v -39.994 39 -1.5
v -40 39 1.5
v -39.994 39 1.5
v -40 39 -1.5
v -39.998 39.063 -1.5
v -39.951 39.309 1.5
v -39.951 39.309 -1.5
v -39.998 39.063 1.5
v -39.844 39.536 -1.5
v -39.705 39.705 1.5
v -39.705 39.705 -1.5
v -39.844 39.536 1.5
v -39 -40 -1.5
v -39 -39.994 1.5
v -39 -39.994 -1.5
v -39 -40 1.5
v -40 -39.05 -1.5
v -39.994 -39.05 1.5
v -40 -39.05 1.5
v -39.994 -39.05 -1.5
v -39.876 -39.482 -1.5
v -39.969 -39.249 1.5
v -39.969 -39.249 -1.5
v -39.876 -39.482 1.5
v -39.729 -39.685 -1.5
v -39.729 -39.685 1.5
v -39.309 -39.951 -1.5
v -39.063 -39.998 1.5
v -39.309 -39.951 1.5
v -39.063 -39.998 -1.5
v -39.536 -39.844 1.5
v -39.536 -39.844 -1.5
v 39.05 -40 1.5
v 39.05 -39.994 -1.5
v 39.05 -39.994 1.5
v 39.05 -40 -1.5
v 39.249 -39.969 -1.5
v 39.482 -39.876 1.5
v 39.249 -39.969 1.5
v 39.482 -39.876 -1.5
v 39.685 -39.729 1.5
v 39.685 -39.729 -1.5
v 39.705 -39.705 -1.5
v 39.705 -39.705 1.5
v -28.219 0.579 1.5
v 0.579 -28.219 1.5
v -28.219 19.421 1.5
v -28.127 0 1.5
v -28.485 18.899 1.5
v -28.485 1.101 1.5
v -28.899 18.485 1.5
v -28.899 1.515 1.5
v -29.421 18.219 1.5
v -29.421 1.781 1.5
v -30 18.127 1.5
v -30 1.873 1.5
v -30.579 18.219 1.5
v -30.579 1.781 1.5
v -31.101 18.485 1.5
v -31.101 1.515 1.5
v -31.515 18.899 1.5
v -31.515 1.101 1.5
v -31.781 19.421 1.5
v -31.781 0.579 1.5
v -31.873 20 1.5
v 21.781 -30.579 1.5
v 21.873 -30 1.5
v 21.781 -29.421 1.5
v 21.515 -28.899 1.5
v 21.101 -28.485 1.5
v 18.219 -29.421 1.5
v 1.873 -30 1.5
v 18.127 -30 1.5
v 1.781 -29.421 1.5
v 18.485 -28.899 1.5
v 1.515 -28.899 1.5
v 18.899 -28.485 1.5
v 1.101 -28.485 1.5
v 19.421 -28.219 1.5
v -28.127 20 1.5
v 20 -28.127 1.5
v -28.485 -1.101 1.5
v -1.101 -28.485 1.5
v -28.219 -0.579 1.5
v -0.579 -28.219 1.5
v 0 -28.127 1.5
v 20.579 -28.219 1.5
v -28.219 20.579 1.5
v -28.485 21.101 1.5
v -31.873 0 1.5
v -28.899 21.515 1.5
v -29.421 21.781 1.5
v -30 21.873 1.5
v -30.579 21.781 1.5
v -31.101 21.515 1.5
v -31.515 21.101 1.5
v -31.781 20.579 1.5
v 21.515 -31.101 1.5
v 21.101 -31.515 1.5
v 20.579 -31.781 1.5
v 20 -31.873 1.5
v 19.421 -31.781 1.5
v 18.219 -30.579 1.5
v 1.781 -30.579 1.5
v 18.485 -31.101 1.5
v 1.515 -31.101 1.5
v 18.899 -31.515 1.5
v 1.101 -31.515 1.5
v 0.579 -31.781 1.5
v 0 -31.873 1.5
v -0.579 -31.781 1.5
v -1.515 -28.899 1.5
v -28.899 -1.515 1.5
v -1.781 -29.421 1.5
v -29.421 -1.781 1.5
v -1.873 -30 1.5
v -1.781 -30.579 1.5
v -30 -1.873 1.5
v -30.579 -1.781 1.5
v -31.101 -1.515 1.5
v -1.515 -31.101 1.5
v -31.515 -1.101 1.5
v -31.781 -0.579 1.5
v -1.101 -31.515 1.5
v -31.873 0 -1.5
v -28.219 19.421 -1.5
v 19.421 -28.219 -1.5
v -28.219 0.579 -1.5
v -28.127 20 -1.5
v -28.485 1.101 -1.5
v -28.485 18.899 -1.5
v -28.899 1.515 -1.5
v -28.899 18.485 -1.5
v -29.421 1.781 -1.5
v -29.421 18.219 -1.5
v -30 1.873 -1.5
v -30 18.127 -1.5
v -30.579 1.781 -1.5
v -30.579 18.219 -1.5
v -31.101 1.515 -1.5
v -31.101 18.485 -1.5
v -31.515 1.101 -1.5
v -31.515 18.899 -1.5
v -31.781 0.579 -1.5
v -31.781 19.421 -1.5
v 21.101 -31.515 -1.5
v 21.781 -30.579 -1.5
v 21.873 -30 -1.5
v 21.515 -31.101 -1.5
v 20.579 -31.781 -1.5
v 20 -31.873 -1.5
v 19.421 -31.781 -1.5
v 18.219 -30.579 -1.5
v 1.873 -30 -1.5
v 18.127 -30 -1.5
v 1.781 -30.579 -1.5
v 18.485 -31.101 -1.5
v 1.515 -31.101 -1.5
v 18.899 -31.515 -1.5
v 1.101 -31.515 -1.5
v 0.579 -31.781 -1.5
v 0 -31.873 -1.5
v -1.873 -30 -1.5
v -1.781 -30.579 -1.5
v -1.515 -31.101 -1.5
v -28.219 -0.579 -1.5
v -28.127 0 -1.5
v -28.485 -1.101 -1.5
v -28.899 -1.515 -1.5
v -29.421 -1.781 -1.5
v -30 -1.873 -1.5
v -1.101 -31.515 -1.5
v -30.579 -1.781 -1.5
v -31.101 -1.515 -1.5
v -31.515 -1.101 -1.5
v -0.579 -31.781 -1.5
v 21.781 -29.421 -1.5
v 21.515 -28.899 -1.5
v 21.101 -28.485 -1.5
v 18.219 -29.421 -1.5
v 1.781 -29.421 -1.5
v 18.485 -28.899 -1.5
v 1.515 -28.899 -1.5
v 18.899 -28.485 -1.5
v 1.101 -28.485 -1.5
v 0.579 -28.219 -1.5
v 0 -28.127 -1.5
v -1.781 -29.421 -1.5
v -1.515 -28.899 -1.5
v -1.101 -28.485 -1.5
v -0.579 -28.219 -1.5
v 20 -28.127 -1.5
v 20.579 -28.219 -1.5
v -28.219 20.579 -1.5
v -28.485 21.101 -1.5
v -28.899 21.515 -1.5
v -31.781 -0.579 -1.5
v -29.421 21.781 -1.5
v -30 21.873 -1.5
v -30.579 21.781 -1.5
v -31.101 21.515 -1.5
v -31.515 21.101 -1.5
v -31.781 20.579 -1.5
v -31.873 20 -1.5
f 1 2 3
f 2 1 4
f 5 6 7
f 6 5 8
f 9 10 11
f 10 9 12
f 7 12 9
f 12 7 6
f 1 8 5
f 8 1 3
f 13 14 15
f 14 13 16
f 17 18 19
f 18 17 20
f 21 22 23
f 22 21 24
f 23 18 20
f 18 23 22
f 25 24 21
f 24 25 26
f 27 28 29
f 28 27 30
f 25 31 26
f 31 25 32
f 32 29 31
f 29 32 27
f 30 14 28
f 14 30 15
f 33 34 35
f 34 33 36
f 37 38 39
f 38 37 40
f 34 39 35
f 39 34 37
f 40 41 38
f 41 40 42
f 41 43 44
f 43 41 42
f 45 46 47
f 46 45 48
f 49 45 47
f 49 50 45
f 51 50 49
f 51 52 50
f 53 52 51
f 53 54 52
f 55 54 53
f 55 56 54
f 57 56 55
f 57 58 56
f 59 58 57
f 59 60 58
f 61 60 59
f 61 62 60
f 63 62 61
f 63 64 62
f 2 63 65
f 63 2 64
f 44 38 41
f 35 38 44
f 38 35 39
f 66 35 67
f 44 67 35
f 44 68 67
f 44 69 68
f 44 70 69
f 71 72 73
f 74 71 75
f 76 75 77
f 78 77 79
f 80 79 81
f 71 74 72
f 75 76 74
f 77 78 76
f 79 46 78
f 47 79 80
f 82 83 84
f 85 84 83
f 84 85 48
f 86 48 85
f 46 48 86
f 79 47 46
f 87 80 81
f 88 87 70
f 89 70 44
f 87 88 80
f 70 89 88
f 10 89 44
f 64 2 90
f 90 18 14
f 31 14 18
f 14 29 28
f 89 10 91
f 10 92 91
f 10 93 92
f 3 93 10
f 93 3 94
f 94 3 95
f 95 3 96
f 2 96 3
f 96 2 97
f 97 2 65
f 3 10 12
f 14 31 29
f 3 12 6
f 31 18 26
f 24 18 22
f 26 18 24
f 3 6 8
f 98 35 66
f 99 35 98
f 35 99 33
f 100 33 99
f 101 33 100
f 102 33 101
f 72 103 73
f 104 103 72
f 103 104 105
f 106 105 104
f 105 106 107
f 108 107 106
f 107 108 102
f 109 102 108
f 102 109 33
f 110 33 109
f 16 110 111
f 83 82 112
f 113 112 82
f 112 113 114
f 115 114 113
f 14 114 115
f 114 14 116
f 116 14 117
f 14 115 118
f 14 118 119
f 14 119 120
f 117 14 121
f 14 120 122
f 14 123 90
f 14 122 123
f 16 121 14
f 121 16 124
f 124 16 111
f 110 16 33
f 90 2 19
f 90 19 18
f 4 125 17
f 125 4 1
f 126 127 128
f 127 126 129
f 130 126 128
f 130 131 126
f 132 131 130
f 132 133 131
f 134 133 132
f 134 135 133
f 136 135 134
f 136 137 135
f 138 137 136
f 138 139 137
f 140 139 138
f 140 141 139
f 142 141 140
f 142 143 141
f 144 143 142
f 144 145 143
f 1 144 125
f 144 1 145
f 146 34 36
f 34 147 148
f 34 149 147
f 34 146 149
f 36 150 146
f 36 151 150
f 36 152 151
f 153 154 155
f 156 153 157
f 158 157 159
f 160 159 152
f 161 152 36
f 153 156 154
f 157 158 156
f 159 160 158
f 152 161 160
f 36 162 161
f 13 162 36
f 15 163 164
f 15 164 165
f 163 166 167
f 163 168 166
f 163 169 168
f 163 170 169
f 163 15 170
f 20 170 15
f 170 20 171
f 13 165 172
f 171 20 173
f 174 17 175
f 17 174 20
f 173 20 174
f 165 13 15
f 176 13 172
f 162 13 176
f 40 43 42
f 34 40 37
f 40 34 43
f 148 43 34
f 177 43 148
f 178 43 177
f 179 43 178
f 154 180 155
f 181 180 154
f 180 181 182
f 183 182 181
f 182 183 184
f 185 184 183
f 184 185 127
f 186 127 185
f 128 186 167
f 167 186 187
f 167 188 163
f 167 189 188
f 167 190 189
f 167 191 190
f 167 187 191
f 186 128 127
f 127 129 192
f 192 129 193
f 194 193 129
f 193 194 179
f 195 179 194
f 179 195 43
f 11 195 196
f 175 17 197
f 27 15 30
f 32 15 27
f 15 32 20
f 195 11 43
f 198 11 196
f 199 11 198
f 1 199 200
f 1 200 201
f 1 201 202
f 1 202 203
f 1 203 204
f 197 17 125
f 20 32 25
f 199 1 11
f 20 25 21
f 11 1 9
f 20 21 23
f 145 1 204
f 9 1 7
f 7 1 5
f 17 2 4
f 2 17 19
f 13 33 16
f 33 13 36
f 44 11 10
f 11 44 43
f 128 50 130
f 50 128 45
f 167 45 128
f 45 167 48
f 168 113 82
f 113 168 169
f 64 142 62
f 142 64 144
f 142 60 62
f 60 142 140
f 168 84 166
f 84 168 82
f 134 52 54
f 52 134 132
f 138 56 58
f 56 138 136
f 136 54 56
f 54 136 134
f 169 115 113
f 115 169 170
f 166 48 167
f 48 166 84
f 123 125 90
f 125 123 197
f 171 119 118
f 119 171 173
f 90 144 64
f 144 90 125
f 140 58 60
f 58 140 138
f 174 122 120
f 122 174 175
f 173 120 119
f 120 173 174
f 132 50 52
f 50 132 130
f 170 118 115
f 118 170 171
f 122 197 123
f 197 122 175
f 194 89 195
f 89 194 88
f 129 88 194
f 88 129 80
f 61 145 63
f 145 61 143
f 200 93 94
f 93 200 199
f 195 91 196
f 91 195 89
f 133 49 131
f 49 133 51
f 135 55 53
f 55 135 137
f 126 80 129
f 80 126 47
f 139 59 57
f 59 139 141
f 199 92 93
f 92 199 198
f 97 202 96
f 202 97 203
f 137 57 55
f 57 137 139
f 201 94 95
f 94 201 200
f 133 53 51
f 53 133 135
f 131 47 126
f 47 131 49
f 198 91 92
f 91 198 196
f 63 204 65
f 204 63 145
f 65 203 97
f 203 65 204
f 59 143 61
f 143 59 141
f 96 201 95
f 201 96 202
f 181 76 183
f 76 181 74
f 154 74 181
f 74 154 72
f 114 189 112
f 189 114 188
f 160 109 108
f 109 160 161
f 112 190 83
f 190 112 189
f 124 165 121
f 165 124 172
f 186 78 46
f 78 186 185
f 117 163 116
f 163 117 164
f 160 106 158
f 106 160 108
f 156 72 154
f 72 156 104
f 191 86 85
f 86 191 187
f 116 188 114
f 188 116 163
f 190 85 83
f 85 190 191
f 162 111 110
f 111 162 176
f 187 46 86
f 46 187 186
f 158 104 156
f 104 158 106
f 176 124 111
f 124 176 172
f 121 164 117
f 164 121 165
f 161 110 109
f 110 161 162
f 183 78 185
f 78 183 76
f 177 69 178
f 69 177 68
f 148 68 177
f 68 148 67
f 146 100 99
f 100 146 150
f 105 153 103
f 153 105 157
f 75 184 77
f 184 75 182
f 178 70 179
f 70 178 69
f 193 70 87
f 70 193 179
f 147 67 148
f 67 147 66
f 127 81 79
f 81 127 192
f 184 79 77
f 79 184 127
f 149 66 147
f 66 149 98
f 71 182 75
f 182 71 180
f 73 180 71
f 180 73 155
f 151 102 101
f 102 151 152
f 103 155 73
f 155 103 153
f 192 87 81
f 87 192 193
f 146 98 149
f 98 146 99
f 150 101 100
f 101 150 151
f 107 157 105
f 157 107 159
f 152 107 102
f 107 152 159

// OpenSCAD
// Minimum needed is 0.02 to ensure properly punched holes. 
holeCreationOffset=0.05;
//How wide the extrusion is
extrusionWidth=20;//[15,20]
extrusionHeight=extrusionWidth;
//How thick the bracket will be, 3 is the default
bracketThickess=3; //[1:10]
bracketLength=extrusionWidth * 4;
triangle2=bracketLength/2;
// M3 or M5 holes
boltHoleDiameter=3.7;//[3.7,5.68]
boltHoleRadius=boltHoleDiameter/2;
squareDiagonal=(bracketLength*sqrt(2));

echo(squareDiagonal);

module cylinder_outer(height,radius,fn){
   fudge = 1/cos(180/fn);
   cylinder(h=height,r=radius*fudge,$fn=fn, center = true);
}
   
module cylinder_outerdual(height,radius,radiustwo,fn){
   fudge = 1/cos(180/fn);
   cylinder(h=height,r1=radius*fudge,r2=radiustwo*fudge,$fn=fn, center = true);
}
   
module cylinder_mid(height,radius,fn){
   fudge = (1+1/cos(180/fn))/2;
   cylinder(h=height,r=radius*fudge,$fn=fn, center = true);
}
   
module createMeniscus(h,radius) {// This module creates the shape that needs to be substracted from a cube to make its corners rounded.
    difference(){        //This shape is basicly the difference between a quarter of cylinder and a cube
       translate([radius/2+0.1,radius/2+0.1,0]){
          cube([radius+0.2,radius+0.1,h+0.2],center=true);         // All that 0.x numbers are to avoid "ghost boundaries" when substracting
       }

       cylinder(h=h+0.2,r=radius,$fn = 25,center=true);
    }
}

module roundCornersCube(x,y,z,r){  // Now we just substract the shape we have created in the four corners
    difference(){
       cube([x,y,z], center=true);

    translate([x/2-r,y/2-r]){  // We move to the first corner (x,y)
          rotate(0){  
             createMeniscus(z,r); // And substract the meniscus
          }
       }
       translate([-x/2+r,y/2-r]){ // To the second corner (-x,y)
          rotate(90){
             createMeniscus(z,r); // But this t�ime we have to rotate the meniscus 90 deg
          }
       }
          translate([-x/2+r,-y/2+r]){ // ... 
          rotate(180){
             createMeniscus(z,r);
          }
       }
          translate([x/2-r,-y/2+r]){
          rotate(270){
             createMeniscus(z,r);
          }
       }
    }
}

module cornerBracket(){
    difference (){
        color([0,0,1]) roundCornersCube(bracketLength, bracketLength,bracketThickess, 1);
        translate([extrusionWidth/2,extrusionWidth/2,0]) rotate([0,0,45]) cube([extrusionHeight, extrusionWidth * 2,bracketThickess + 1], center=true);
        translate([squareDiagonal/4,squareDiagonal/4,0])  rotate([0,0,45]) cube([bracketLength, bracketLength*2,bracketThickess + 1], center=true);
        
        translate(v = [ -(bracketLength/2) + (extrusionWidth/2), -(bracketLength/2) + (extrusionWidth) + extrusionWidth, 0 ]) cylinder_outer(bracketThickess * 2,boltHoleRadius,20);
        translate(v = [ -(bracketLength/2) + (extrusionWidth/2),-(bracketLength/2) + (extrusionWidth * 2)+ extrusionWidth , 0 ]) cylinder_outer(bracketThickess * 2,boltHoleRadius,20);


        translate(v = [ -(bracketLength/2) + (extrusionWidth ) + extrusionWidth,-(bracketLength/2) + (extrusionWidth/2), 0 ]) cylinder_outer(bracketThickess * 2,boltHoleRadius,20);
        translate(v = [ -(bracketLength/2) + (extrusionWidth * 2) + extrusionWidth,-(bracketLength/2) + (extrusionWidth/2), 0 ]) cylinder_outer(bracketThickess * 2,boltHoleRadius,20);
    }
    
}

cornerBracket();
